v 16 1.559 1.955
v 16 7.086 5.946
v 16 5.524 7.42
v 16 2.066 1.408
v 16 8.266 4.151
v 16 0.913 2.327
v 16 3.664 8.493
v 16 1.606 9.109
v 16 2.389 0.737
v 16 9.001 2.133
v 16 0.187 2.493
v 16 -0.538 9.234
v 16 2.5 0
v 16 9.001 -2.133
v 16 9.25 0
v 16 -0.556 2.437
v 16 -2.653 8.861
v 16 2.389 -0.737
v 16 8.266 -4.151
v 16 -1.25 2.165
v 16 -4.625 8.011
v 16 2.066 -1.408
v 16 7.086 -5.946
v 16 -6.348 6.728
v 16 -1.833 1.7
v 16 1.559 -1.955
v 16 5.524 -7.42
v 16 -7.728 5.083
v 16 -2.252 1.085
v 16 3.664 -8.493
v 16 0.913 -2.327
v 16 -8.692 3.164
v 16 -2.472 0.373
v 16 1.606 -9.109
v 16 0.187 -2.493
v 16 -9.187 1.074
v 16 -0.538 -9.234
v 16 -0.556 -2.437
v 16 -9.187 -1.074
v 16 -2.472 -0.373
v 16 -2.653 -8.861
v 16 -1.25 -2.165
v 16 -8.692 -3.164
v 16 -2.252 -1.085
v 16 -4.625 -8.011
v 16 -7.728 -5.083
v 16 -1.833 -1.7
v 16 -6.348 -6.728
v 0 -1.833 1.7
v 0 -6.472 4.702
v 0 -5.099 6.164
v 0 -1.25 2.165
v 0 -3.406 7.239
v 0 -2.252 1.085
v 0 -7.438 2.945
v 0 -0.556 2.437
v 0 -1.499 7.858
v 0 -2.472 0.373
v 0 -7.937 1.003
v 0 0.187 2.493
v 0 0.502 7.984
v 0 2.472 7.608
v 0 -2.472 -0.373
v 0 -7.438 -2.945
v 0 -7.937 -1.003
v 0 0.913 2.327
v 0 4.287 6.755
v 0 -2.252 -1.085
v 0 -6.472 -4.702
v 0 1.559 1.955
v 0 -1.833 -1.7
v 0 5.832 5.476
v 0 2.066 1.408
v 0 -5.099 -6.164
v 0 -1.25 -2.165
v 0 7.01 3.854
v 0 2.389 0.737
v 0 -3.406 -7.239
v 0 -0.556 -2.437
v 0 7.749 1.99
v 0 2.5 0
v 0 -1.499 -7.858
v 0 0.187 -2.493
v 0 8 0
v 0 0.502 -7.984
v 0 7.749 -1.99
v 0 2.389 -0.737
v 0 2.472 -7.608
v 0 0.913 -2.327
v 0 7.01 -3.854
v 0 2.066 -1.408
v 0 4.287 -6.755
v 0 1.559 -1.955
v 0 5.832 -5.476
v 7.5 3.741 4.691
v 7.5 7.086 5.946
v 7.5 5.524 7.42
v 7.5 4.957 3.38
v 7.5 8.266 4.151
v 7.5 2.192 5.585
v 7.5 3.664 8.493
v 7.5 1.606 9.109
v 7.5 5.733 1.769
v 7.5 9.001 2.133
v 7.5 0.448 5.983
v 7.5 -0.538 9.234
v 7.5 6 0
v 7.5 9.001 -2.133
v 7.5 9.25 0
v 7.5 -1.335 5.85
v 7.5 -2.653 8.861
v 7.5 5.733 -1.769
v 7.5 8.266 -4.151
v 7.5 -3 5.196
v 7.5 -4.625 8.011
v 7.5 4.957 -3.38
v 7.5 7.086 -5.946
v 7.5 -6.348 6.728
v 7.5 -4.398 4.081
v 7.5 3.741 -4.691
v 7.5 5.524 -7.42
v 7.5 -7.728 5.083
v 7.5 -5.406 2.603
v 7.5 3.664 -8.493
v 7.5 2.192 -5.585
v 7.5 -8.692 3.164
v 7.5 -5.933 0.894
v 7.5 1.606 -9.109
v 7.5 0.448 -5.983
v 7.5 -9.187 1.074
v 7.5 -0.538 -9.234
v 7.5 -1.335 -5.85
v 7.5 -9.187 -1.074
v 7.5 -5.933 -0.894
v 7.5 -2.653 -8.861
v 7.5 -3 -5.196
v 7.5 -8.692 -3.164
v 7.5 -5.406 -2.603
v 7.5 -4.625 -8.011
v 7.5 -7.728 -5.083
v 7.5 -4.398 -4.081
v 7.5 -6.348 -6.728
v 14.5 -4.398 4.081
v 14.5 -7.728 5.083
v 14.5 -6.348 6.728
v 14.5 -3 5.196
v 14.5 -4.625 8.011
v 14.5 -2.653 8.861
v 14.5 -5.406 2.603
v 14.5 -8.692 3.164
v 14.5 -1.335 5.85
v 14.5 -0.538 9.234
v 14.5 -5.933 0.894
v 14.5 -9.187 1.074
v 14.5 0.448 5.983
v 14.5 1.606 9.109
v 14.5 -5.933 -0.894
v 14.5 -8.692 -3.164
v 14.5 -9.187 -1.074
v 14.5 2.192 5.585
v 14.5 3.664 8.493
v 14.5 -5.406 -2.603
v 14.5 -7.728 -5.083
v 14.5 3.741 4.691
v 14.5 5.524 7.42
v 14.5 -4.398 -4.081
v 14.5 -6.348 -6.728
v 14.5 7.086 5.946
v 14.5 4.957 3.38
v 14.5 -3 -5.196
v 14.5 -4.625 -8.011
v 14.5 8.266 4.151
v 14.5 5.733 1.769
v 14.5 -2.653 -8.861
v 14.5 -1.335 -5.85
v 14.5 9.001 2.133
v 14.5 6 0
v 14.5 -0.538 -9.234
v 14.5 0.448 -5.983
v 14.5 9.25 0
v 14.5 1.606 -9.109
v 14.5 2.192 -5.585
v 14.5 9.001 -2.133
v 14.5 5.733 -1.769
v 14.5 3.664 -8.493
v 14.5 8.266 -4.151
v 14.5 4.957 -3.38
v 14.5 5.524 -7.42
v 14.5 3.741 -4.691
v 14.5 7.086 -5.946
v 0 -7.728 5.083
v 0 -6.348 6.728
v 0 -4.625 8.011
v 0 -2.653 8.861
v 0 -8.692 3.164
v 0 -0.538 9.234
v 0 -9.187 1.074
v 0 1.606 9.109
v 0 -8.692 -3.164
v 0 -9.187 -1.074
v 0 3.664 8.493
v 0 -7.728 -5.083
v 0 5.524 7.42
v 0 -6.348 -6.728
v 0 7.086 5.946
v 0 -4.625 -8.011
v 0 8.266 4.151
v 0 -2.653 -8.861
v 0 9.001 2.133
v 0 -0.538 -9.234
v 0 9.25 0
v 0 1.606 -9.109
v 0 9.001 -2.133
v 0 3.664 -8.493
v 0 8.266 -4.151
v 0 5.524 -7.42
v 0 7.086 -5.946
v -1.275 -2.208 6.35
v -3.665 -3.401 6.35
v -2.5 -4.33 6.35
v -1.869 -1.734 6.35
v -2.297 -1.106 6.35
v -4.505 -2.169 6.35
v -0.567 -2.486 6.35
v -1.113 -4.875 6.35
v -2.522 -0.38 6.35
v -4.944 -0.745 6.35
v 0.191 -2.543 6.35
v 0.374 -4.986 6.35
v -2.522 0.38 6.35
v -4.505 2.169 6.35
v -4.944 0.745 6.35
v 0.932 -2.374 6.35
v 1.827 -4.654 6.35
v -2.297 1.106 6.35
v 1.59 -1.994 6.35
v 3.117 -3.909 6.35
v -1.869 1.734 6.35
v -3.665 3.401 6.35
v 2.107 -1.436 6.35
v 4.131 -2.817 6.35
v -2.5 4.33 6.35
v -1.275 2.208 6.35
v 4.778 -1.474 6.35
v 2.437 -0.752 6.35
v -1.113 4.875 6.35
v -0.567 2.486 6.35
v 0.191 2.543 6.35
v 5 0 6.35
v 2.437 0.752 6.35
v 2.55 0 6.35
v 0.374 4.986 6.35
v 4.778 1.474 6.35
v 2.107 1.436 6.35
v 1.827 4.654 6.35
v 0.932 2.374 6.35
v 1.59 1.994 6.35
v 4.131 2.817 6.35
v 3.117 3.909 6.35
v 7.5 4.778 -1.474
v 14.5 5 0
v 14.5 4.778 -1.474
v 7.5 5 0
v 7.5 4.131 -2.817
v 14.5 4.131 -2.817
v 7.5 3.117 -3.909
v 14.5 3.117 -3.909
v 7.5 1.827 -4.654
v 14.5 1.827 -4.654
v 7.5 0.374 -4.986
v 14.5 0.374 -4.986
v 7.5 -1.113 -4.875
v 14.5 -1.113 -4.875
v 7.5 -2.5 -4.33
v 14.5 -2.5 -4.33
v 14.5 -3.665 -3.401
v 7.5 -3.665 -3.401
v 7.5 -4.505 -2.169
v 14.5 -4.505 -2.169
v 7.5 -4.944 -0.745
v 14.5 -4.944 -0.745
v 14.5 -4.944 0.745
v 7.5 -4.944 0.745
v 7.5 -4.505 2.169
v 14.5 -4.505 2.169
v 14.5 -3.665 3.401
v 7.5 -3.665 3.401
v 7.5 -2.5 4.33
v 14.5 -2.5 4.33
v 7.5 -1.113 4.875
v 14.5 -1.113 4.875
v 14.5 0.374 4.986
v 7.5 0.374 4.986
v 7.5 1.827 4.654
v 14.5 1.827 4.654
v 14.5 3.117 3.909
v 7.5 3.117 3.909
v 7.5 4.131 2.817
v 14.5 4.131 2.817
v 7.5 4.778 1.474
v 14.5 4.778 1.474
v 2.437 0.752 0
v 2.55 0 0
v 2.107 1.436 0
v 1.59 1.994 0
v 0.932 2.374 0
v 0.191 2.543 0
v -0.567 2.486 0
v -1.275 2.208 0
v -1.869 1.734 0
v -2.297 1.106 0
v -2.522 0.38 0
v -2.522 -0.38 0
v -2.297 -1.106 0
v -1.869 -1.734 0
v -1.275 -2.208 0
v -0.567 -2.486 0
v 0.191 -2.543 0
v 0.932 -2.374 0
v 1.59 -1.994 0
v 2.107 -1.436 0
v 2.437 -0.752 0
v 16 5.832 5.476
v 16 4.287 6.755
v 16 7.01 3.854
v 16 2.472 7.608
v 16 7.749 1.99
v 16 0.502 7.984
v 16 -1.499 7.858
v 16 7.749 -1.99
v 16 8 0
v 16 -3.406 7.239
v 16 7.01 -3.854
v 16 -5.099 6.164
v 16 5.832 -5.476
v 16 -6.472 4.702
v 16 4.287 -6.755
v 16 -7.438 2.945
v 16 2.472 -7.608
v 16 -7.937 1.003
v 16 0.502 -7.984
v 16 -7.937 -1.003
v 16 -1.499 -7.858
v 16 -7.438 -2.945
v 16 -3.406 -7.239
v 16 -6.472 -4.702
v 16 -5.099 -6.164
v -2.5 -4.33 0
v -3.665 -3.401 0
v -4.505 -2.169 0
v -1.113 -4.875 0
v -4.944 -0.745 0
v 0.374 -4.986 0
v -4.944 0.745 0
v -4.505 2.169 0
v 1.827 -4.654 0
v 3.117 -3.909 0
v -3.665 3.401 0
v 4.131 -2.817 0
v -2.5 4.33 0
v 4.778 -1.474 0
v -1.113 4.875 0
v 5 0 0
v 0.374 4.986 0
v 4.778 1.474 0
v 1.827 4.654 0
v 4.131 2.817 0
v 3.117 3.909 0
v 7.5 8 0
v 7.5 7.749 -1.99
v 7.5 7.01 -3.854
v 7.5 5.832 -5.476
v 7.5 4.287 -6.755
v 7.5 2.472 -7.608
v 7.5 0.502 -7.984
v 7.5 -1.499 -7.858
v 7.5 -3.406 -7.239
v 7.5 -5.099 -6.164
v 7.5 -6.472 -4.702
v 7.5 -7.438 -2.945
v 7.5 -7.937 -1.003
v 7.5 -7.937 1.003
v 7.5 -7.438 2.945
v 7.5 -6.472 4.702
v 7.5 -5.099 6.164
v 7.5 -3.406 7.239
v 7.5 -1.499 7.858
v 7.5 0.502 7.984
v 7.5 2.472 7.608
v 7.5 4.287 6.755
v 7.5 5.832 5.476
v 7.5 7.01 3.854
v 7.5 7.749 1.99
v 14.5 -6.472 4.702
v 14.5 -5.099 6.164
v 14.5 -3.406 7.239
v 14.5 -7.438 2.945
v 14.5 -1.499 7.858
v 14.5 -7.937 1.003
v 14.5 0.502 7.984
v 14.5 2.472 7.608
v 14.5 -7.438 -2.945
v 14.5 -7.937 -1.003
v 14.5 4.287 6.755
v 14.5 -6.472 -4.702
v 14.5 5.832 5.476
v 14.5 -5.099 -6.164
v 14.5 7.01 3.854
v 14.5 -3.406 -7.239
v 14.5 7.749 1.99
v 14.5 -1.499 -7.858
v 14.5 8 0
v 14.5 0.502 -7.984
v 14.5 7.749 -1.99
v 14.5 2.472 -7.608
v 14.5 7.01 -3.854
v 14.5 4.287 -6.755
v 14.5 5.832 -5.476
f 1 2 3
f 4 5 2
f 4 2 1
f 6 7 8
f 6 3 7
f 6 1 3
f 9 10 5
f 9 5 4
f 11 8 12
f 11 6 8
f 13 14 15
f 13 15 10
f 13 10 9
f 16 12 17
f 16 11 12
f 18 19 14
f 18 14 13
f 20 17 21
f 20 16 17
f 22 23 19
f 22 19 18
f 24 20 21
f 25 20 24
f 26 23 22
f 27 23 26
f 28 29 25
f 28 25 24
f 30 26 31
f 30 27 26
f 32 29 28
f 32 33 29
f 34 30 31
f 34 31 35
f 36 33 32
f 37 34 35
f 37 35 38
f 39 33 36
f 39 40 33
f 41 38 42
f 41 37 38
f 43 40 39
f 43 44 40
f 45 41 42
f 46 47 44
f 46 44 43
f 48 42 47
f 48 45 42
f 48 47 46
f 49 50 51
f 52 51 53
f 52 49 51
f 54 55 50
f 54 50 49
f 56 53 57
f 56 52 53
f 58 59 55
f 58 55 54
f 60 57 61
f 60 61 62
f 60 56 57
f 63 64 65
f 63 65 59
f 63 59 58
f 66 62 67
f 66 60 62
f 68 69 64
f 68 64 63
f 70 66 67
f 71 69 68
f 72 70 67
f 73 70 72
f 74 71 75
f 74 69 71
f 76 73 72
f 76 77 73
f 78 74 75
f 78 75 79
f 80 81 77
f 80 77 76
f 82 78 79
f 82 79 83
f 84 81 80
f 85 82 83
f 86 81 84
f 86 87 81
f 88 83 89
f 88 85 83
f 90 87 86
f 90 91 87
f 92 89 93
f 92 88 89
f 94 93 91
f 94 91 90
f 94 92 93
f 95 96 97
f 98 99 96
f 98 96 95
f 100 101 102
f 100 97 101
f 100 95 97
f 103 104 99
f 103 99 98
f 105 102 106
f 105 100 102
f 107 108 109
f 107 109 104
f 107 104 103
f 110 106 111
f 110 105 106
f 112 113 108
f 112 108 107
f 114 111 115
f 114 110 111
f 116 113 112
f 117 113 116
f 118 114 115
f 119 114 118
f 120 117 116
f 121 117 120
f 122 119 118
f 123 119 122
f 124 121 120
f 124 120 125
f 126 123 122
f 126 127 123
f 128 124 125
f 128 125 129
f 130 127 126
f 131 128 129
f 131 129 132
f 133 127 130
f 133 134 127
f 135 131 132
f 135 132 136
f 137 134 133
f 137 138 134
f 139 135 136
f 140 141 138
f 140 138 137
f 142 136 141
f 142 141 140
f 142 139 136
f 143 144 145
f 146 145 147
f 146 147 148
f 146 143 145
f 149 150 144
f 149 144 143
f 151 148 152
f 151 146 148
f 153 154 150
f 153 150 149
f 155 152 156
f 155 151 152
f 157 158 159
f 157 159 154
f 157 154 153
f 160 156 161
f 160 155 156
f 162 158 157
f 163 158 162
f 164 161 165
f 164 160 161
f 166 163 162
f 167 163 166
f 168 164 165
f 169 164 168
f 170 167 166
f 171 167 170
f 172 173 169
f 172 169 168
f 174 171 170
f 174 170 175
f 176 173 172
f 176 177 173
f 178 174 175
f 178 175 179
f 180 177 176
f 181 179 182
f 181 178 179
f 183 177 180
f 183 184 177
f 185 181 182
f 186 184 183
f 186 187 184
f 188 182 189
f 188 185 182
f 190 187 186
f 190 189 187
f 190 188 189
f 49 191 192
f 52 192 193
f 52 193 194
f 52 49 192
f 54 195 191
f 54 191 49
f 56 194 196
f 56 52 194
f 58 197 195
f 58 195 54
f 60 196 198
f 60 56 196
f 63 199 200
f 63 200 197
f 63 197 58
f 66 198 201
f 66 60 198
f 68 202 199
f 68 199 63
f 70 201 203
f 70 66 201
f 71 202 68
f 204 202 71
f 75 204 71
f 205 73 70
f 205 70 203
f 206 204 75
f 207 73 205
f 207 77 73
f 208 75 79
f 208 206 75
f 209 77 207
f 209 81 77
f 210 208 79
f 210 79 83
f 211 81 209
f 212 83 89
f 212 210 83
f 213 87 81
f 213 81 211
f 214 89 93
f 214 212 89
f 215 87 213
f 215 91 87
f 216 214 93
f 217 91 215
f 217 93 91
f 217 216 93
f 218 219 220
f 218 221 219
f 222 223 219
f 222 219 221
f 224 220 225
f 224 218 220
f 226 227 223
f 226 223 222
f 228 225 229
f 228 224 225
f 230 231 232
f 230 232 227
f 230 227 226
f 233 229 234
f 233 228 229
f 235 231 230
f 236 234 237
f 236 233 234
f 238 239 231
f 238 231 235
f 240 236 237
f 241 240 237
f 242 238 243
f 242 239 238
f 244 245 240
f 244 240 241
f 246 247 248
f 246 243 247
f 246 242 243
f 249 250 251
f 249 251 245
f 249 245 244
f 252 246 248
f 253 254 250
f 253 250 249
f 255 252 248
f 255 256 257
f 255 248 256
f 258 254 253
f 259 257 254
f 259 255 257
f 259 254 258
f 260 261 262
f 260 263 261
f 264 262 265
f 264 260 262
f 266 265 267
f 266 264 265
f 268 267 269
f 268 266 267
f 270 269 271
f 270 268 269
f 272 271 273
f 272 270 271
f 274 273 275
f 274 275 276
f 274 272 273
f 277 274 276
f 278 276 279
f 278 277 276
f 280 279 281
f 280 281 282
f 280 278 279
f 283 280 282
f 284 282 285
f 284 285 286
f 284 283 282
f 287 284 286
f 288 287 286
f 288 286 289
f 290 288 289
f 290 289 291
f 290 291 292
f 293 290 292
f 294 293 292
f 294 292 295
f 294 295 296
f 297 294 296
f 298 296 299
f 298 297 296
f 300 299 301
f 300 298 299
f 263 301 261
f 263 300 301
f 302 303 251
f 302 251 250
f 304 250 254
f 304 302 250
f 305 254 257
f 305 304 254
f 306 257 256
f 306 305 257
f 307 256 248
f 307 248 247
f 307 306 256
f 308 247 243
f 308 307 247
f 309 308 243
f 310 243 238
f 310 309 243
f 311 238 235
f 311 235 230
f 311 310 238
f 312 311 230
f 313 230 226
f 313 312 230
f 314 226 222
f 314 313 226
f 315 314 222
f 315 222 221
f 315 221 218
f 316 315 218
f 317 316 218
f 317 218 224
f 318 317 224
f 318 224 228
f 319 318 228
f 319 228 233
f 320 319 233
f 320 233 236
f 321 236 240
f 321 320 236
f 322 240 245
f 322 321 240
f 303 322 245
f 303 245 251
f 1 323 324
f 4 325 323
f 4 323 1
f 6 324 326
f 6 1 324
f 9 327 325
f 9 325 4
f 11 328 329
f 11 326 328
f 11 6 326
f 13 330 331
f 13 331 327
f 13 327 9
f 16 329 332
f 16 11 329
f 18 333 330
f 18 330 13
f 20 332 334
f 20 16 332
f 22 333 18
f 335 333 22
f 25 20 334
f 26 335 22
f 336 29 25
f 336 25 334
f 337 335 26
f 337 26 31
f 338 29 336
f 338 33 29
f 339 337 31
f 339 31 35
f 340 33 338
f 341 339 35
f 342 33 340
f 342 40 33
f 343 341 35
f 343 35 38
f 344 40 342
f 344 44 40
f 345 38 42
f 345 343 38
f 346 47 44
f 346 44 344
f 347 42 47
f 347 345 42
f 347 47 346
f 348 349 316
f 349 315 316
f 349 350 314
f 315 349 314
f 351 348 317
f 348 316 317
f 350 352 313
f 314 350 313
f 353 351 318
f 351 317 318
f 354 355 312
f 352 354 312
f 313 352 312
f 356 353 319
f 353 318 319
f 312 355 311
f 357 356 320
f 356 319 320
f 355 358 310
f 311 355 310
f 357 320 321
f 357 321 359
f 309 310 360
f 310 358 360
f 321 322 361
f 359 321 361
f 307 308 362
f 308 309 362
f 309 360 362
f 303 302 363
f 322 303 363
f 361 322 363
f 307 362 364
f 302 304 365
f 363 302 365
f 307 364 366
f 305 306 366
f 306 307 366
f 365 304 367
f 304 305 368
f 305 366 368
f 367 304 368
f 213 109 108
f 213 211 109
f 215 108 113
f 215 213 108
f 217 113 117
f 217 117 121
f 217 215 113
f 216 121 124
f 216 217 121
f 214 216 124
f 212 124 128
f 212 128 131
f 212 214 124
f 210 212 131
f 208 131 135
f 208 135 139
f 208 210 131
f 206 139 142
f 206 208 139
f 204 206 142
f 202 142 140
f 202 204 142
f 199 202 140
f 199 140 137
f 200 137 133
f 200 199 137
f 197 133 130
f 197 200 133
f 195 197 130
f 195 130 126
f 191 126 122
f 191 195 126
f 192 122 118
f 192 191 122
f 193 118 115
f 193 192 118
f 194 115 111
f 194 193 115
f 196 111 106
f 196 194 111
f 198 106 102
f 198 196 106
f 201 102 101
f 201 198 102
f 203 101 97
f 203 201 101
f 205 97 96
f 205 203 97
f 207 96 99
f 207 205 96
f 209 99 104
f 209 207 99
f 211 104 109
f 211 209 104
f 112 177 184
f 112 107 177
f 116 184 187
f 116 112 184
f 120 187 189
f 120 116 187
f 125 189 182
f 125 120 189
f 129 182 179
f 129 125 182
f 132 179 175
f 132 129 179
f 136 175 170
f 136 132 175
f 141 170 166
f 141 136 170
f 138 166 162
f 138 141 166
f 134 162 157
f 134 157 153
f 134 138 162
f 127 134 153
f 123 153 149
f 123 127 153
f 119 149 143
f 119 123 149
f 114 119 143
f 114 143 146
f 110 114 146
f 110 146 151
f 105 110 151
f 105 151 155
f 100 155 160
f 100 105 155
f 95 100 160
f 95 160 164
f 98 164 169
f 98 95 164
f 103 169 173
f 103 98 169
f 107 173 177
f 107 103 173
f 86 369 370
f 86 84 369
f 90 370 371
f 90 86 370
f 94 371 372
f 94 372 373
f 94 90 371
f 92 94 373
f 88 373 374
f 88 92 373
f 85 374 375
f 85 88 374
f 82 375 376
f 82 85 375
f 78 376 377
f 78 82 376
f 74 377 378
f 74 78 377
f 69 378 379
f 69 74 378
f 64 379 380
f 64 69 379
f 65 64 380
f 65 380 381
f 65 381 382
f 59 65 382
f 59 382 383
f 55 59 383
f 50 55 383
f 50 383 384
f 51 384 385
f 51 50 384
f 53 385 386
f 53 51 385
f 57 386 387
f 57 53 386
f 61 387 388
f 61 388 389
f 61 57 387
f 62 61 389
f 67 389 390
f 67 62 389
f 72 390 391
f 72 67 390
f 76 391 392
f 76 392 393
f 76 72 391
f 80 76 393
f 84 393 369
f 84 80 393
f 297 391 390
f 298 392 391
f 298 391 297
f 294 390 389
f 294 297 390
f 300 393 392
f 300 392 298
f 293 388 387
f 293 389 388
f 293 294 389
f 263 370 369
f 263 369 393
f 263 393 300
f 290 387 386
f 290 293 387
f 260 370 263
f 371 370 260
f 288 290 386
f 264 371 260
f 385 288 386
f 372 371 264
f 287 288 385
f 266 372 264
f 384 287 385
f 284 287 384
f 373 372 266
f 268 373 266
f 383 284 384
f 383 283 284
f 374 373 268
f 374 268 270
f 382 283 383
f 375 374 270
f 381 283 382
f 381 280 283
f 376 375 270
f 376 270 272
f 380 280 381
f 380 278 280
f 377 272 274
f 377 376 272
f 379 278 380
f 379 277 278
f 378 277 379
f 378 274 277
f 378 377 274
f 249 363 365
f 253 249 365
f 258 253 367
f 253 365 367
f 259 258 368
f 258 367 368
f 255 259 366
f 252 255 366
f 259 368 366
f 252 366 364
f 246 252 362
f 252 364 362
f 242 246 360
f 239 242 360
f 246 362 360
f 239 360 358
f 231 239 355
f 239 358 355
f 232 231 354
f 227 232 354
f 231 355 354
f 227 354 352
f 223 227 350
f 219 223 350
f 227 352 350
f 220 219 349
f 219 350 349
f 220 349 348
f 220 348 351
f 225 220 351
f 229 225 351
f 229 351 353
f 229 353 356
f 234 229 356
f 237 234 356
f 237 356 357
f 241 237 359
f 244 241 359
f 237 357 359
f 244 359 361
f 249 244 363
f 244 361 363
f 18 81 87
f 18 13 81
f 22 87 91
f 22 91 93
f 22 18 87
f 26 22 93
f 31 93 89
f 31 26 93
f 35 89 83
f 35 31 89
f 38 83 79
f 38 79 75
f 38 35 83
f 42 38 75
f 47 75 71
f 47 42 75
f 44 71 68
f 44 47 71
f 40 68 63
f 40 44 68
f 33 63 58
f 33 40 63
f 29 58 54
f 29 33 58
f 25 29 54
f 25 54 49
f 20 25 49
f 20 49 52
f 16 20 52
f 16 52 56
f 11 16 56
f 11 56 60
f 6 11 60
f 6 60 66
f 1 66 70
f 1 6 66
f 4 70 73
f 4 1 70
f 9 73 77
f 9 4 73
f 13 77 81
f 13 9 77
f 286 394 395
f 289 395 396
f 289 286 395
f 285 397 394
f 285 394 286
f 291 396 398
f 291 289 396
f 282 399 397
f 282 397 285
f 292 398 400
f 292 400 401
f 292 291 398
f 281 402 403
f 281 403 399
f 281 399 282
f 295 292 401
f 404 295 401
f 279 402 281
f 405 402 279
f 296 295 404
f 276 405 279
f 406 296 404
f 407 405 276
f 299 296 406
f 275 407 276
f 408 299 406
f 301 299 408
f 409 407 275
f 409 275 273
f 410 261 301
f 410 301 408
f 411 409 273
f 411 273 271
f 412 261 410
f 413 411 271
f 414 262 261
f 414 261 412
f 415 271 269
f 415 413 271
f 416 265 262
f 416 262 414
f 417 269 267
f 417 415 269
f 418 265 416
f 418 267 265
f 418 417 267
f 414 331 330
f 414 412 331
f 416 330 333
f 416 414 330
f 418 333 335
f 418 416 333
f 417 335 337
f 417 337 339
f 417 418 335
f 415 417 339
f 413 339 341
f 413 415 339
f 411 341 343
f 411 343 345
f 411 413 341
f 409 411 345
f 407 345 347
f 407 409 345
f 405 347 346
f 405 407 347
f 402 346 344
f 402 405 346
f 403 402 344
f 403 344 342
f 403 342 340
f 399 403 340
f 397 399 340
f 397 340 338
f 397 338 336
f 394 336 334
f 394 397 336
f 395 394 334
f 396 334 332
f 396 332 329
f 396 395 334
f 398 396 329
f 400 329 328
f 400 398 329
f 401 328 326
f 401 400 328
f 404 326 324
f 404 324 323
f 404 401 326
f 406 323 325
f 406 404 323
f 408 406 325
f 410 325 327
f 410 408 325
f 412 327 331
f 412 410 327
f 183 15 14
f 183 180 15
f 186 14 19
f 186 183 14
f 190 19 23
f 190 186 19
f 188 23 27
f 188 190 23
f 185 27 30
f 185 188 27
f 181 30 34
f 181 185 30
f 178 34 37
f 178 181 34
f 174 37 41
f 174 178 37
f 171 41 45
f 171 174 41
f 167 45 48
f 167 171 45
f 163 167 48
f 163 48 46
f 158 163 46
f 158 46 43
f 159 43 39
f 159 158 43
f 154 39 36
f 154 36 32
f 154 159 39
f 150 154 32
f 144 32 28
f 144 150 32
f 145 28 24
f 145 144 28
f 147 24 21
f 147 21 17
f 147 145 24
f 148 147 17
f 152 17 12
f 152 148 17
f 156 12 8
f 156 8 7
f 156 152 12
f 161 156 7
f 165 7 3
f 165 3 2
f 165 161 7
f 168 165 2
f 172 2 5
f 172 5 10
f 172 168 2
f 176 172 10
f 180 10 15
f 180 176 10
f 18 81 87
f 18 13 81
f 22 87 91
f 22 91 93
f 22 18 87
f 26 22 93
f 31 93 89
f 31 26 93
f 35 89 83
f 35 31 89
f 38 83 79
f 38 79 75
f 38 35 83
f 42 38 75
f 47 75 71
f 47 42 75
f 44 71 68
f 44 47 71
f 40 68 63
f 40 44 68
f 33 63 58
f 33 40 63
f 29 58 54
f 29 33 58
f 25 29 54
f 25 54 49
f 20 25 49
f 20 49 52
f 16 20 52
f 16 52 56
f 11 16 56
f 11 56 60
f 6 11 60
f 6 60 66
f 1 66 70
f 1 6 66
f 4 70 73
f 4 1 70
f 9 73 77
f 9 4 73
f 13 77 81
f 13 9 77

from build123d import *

# Parameters (mm, degrees)
F4_R     = 5
F4_R_2   = 2.55
F5_DEPTH = 6.35


with BuildPart() as f1:
    # F0 (on Top) → F1 (revolve)
    with BuildSketch(Plane.XY):
        Polygon((0, 8), (0, 2.5), (16, 2.5), (16, 8), (14.5, 8), (14.5, 5), (7.5, 5), (7.5, 8), align=None)
    revolve(axis=Axis((-19.000001, 0, 0), (-1, 0, 0)))


with BuildPart() as f3:
    # F2 (on Top) → F3 (revolve)
    with BuildSketch(Plane.XY):
        Polygon((0, 9.25), (0, 2.5), (16, 2.5), (16, 9.25), (14.5, 9.25), (14.5, 6), (7.5, 6), (7.5, 9.25), align=None)
    revolve(axis=Axis((24.657246, 0, 0), (-1, 0, 0)))


with BuildPart() as f5:
    # F4 (on Top) → F5 (new body)
    with BuildSketch(Plane.XY):
        Circle(F4_R)
        Circle(F4_R_2, mode=Mode.SUBTRACT)
    extrude(amount=F5_DEPTH)


solid = Compound([f1.part, f3.part, f5.part])
